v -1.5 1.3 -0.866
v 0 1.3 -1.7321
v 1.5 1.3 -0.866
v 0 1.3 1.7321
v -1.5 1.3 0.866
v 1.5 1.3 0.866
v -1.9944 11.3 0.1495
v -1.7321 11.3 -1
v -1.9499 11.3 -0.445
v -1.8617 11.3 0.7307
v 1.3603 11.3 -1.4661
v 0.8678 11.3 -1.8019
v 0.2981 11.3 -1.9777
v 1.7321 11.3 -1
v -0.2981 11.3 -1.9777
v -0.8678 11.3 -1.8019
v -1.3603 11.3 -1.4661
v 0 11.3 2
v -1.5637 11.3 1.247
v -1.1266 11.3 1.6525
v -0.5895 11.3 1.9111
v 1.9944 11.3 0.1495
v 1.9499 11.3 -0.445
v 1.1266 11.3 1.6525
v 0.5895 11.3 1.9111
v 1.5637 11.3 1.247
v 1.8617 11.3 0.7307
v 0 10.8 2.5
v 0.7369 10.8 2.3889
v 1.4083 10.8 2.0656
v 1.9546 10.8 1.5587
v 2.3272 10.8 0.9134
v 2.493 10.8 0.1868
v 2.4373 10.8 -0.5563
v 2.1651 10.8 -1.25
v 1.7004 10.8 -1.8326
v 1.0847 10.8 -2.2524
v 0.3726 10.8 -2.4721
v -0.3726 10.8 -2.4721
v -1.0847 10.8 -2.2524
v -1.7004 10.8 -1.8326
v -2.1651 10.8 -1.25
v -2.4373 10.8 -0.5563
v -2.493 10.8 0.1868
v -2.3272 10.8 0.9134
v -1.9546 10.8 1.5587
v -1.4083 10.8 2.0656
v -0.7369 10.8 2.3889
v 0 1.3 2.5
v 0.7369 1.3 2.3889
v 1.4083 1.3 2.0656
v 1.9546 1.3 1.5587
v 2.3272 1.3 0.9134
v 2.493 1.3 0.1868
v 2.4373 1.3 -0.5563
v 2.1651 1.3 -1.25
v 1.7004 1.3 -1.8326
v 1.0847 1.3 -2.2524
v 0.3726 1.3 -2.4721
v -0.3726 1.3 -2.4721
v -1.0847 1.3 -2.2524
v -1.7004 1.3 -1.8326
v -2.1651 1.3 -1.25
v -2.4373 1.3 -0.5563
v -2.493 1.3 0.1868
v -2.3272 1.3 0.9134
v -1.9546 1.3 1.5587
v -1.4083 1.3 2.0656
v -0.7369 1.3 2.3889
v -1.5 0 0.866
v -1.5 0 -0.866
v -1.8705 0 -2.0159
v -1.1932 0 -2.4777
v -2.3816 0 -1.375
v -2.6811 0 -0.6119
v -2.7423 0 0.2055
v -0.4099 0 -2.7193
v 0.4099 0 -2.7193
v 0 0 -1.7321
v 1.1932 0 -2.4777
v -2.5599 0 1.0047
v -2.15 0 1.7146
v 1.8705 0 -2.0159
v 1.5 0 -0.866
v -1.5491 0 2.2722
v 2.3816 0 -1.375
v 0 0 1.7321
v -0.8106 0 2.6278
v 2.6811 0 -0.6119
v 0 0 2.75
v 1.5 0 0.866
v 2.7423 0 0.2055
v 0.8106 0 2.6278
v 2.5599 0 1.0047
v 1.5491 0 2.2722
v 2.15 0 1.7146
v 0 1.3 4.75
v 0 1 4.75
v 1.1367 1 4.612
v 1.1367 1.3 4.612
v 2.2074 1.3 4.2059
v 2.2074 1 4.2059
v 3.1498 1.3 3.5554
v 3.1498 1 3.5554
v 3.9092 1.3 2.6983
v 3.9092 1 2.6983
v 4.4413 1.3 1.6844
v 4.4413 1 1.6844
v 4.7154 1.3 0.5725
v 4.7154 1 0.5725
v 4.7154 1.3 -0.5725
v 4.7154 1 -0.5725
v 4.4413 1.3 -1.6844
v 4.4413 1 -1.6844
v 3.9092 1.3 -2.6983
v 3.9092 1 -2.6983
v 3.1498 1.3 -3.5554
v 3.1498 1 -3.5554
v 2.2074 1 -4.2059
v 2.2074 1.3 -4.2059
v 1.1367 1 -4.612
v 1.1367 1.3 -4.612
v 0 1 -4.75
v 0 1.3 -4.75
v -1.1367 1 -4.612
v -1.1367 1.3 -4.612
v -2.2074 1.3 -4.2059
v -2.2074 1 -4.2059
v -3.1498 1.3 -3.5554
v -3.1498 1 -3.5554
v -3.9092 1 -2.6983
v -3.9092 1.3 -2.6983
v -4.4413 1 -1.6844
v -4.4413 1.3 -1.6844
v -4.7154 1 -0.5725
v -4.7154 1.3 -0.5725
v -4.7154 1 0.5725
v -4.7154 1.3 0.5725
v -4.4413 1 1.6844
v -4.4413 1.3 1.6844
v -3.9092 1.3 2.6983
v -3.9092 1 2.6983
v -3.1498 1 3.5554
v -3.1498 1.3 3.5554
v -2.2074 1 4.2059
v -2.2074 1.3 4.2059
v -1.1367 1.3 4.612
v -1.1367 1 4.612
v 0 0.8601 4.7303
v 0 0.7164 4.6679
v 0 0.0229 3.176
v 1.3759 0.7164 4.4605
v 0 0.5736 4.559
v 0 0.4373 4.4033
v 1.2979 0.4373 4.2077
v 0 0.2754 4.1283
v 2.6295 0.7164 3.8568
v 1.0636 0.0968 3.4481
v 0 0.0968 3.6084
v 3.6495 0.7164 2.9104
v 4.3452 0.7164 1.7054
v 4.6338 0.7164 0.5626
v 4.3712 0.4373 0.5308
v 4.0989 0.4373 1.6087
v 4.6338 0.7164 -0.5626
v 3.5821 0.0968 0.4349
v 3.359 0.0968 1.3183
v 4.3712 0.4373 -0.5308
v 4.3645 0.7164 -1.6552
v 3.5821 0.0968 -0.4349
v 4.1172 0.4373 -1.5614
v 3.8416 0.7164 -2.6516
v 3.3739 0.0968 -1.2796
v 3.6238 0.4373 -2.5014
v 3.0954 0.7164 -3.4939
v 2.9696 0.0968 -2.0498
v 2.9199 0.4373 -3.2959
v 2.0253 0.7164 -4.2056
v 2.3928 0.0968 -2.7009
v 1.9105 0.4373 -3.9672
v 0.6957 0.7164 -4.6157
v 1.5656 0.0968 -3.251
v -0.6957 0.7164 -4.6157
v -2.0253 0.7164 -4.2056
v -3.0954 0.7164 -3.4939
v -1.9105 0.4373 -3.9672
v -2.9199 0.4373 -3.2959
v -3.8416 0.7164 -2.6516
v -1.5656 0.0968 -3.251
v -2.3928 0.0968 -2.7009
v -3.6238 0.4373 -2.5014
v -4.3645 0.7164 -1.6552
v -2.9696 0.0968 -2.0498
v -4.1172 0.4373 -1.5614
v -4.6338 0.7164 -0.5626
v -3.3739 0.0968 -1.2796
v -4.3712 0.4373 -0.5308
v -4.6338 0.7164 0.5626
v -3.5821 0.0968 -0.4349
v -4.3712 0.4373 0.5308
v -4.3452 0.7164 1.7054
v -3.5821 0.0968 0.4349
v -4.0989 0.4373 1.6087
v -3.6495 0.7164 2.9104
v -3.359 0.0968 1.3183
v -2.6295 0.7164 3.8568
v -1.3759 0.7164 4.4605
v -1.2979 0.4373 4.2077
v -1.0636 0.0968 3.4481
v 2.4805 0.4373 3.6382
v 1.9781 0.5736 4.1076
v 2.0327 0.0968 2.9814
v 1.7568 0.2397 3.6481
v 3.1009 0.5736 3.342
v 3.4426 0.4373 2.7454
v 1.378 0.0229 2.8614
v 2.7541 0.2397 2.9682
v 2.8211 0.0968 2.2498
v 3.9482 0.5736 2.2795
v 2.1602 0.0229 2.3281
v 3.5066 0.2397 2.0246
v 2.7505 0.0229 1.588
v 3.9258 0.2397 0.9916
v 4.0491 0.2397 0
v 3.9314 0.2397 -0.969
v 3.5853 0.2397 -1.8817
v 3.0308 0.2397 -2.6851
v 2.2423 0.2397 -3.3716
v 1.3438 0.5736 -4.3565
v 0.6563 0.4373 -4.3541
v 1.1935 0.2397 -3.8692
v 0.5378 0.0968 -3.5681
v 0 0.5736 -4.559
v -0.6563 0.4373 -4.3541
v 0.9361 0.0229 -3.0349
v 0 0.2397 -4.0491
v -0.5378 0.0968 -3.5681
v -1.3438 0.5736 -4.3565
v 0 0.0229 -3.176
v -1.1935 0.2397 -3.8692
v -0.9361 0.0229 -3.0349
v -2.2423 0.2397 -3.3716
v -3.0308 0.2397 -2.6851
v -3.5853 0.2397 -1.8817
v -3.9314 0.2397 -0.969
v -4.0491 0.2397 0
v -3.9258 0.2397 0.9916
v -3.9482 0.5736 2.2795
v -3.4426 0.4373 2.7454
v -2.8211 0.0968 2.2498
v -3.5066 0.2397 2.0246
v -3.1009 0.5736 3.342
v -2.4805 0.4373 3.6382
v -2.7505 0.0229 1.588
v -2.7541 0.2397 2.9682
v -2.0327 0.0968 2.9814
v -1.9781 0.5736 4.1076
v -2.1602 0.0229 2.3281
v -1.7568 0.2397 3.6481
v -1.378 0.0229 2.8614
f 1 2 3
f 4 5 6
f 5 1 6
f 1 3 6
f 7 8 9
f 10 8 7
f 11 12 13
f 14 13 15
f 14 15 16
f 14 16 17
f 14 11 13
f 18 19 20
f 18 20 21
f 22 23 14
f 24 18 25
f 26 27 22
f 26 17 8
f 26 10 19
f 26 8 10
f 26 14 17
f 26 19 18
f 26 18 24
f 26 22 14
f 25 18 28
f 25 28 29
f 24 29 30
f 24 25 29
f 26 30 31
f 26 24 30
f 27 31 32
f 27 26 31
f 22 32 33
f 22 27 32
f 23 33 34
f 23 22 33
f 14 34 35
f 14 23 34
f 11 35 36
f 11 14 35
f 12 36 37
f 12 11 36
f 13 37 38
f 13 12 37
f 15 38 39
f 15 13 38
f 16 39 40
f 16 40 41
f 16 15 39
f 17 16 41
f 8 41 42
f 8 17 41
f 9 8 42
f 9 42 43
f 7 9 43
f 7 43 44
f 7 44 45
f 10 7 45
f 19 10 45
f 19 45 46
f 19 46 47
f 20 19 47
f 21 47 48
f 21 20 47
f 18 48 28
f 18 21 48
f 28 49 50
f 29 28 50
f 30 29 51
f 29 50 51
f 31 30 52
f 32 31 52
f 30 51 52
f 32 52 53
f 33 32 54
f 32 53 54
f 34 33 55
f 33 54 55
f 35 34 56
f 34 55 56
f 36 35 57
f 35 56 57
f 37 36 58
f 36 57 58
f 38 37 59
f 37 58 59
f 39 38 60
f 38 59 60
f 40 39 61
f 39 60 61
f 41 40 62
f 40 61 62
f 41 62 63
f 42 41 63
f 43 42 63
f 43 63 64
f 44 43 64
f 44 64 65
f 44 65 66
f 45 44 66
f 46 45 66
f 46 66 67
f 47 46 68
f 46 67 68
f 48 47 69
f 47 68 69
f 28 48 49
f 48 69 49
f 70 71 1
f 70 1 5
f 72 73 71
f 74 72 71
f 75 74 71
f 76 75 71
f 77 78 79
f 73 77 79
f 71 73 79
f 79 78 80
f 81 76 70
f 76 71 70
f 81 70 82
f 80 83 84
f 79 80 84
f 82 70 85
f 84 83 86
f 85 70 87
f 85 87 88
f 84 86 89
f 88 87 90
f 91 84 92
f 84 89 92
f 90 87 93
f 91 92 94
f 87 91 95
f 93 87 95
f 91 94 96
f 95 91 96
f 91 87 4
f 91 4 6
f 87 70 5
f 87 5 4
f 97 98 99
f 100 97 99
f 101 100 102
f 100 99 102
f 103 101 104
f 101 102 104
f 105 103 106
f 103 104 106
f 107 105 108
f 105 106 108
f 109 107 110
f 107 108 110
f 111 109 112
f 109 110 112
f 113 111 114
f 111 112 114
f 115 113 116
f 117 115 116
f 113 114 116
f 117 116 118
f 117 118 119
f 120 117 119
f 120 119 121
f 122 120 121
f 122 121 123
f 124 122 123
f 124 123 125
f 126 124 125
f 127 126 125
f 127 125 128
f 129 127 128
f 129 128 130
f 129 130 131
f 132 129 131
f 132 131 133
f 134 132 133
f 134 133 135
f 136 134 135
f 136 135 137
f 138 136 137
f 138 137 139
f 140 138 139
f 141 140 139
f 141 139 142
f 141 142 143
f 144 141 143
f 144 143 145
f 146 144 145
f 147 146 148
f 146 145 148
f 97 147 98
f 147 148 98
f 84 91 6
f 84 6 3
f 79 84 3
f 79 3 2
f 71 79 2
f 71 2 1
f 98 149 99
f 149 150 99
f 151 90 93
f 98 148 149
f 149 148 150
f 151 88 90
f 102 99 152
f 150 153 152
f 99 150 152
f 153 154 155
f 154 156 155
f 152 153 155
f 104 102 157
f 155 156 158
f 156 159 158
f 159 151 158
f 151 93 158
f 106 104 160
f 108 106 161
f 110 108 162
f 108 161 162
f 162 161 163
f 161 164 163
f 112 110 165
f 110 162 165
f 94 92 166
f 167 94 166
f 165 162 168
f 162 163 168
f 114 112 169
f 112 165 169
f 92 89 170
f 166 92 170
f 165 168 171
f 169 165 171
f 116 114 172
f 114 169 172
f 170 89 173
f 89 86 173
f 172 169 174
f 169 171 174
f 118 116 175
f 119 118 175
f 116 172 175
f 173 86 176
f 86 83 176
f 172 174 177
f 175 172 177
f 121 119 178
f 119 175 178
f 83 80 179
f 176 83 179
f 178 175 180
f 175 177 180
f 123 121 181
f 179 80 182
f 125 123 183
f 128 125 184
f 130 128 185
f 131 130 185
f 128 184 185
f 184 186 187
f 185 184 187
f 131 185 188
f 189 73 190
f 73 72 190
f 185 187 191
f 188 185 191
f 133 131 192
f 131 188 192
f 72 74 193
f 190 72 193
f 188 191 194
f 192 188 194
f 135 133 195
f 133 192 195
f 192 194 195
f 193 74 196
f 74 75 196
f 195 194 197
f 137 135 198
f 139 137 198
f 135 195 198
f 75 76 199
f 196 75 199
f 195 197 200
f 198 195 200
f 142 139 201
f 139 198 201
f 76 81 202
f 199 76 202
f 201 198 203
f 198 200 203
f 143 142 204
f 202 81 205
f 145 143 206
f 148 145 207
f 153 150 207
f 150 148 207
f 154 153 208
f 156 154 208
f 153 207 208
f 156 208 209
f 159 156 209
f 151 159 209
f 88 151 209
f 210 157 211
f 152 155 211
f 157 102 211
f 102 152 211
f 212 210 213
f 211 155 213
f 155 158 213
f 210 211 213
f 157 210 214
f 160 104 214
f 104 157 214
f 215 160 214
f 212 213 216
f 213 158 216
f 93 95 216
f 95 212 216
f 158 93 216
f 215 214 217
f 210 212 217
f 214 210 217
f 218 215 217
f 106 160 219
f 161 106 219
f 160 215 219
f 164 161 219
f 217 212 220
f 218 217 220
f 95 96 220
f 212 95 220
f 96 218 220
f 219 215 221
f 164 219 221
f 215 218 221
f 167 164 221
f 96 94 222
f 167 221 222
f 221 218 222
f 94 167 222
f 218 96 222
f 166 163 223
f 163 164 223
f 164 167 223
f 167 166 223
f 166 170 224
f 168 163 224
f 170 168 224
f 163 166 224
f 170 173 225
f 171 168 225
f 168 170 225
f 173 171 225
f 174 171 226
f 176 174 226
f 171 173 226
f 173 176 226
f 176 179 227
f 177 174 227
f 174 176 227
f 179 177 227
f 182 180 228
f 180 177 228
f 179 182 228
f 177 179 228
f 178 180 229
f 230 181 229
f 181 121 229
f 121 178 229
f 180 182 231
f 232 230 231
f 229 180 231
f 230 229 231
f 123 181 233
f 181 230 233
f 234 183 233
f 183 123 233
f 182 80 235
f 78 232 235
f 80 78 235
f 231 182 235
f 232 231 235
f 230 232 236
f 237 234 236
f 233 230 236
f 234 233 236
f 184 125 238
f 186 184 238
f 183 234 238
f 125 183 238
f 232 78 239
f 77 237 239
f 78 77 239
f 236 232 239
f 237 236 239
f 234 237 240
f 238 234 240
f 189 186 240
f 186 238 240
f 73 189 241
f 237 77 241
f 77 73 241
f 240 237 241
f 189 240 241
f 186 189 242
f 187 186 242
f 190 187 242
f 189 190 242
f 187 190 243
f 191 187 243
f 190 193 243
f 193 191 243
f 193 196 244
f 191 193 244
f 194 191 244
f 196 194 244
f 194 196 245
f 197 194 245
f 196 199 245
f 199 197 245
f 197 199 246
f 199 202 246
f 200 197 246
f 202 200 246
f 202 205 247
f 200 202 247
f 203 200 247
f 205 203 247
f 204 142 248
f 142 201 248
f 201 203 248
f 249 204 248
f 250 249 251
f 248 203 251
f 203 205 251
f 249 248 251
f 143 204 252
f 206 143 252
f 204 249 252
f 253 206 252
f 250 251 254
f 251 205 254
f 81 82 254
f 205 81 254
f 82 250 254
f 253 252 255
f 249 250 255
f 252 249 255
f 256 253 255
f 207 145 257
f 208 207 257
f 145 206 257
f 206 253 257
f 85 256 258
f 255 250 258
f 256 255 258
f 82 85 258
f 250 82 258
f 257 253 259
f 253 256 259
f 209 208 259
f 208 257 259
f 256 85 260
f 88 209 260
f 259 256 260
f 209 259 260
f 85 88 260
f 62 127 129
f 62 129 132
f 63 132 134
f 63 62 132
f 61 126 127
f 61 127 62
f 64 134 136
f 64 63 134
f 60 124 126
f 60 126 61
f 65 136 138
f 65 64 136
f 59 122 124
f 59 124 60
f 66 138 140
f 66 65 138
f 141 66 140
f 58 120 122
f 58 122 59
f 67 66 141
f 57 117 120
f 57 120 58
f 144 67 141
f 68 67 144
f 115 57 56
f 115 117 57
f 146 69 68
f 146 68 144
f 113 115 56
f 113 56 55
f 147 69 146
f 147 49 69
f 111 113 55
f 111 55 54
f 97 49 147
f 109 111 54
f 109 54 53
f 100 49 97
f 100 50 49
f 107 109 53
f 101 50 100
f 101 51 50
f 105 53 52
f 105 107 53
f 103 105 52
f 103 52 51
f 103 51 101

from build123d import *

# Parameters (mm, degrees)
SKETCH_1_R      = 4.75
EXTRUDE_1_DEPTH = 1.3
SKETCH_2_R      = 2.5
EXTRUDE_2_DEPTH = 10
CHAMFER_1_SIZE  = 0.5
FILLET_1_SIZE   = 1
FILLET_1_SIZE_2 = 2


with BuildPart() as part:
    # 草图1 → 凸台-拉伸1 (new body)
    with BuildSketch(Plane(origin=(0, 0, 0), x_dir=(1, 0, 0), z_dir=(0, 1, 0))):
        with Locations(Location((0, 0, 0), (0, 0, 270))):
            Circle(SKETCH_1_R)
        Polygon((0, -1.732050808), (1.5, -0.866025404), (1.5, 0.866025404), (0, 1.732050808), (-1.5, 0.866025404), (-1.5, -0.866025404), align=None, mode=Mode.SUBTRACT)
    extrude(amount=EXTRUDE_1_DEPTH)

    # 草图2 → 凸台-拉伸2 (add)
    with BuildSketch(Plane(origin=(0, 1.3, 0), x_dir=(1, 0, 0), z_dir=(0, 1, 0))):
        with Locations(Location((0, 0, 0), (0, 0, 270))):
            Circle(SKETCH_2_R)
    extrude(amount=EXTRUDE_2_DEPTH)

    # 倒角1
    chamfer_1_edges = [part.edges().sort_by_distance(p)[0] for p in [
        (0, 11.3, -2.5),
    ]]
    chamfer(chamfer_1_edges, length=CHAMFER_1_SIZE)

    # 圆角1
    # an asymmetric fillet: 2, 1 mm, written as the material it takes off along each edge
    with BuildSketch(Plane(origin=(0, 0, 0), x_dir=(0, 0, 1), z_dir=(-1, 0, 0))) as fillet_1_piece_1:
        with BuildLine():
            Bezier((4.75, FILLET_1_SIZE), (4.75, 0), (4.75 - FILLET_1_SIZE_2, 0), weights=[1, 0.707106781, 1])
            Line((4.75 - FILLET_1_SIZE_2, 0), (4.75, 0))
            Line((4.75, 0), (4.75, FILLET_1_SIZE))
        make_face()
    revolve(axis=Axis((0, 0, 0), (0, 1, 0)), mode=Mode.SUBTRACT)


solid = part.part
